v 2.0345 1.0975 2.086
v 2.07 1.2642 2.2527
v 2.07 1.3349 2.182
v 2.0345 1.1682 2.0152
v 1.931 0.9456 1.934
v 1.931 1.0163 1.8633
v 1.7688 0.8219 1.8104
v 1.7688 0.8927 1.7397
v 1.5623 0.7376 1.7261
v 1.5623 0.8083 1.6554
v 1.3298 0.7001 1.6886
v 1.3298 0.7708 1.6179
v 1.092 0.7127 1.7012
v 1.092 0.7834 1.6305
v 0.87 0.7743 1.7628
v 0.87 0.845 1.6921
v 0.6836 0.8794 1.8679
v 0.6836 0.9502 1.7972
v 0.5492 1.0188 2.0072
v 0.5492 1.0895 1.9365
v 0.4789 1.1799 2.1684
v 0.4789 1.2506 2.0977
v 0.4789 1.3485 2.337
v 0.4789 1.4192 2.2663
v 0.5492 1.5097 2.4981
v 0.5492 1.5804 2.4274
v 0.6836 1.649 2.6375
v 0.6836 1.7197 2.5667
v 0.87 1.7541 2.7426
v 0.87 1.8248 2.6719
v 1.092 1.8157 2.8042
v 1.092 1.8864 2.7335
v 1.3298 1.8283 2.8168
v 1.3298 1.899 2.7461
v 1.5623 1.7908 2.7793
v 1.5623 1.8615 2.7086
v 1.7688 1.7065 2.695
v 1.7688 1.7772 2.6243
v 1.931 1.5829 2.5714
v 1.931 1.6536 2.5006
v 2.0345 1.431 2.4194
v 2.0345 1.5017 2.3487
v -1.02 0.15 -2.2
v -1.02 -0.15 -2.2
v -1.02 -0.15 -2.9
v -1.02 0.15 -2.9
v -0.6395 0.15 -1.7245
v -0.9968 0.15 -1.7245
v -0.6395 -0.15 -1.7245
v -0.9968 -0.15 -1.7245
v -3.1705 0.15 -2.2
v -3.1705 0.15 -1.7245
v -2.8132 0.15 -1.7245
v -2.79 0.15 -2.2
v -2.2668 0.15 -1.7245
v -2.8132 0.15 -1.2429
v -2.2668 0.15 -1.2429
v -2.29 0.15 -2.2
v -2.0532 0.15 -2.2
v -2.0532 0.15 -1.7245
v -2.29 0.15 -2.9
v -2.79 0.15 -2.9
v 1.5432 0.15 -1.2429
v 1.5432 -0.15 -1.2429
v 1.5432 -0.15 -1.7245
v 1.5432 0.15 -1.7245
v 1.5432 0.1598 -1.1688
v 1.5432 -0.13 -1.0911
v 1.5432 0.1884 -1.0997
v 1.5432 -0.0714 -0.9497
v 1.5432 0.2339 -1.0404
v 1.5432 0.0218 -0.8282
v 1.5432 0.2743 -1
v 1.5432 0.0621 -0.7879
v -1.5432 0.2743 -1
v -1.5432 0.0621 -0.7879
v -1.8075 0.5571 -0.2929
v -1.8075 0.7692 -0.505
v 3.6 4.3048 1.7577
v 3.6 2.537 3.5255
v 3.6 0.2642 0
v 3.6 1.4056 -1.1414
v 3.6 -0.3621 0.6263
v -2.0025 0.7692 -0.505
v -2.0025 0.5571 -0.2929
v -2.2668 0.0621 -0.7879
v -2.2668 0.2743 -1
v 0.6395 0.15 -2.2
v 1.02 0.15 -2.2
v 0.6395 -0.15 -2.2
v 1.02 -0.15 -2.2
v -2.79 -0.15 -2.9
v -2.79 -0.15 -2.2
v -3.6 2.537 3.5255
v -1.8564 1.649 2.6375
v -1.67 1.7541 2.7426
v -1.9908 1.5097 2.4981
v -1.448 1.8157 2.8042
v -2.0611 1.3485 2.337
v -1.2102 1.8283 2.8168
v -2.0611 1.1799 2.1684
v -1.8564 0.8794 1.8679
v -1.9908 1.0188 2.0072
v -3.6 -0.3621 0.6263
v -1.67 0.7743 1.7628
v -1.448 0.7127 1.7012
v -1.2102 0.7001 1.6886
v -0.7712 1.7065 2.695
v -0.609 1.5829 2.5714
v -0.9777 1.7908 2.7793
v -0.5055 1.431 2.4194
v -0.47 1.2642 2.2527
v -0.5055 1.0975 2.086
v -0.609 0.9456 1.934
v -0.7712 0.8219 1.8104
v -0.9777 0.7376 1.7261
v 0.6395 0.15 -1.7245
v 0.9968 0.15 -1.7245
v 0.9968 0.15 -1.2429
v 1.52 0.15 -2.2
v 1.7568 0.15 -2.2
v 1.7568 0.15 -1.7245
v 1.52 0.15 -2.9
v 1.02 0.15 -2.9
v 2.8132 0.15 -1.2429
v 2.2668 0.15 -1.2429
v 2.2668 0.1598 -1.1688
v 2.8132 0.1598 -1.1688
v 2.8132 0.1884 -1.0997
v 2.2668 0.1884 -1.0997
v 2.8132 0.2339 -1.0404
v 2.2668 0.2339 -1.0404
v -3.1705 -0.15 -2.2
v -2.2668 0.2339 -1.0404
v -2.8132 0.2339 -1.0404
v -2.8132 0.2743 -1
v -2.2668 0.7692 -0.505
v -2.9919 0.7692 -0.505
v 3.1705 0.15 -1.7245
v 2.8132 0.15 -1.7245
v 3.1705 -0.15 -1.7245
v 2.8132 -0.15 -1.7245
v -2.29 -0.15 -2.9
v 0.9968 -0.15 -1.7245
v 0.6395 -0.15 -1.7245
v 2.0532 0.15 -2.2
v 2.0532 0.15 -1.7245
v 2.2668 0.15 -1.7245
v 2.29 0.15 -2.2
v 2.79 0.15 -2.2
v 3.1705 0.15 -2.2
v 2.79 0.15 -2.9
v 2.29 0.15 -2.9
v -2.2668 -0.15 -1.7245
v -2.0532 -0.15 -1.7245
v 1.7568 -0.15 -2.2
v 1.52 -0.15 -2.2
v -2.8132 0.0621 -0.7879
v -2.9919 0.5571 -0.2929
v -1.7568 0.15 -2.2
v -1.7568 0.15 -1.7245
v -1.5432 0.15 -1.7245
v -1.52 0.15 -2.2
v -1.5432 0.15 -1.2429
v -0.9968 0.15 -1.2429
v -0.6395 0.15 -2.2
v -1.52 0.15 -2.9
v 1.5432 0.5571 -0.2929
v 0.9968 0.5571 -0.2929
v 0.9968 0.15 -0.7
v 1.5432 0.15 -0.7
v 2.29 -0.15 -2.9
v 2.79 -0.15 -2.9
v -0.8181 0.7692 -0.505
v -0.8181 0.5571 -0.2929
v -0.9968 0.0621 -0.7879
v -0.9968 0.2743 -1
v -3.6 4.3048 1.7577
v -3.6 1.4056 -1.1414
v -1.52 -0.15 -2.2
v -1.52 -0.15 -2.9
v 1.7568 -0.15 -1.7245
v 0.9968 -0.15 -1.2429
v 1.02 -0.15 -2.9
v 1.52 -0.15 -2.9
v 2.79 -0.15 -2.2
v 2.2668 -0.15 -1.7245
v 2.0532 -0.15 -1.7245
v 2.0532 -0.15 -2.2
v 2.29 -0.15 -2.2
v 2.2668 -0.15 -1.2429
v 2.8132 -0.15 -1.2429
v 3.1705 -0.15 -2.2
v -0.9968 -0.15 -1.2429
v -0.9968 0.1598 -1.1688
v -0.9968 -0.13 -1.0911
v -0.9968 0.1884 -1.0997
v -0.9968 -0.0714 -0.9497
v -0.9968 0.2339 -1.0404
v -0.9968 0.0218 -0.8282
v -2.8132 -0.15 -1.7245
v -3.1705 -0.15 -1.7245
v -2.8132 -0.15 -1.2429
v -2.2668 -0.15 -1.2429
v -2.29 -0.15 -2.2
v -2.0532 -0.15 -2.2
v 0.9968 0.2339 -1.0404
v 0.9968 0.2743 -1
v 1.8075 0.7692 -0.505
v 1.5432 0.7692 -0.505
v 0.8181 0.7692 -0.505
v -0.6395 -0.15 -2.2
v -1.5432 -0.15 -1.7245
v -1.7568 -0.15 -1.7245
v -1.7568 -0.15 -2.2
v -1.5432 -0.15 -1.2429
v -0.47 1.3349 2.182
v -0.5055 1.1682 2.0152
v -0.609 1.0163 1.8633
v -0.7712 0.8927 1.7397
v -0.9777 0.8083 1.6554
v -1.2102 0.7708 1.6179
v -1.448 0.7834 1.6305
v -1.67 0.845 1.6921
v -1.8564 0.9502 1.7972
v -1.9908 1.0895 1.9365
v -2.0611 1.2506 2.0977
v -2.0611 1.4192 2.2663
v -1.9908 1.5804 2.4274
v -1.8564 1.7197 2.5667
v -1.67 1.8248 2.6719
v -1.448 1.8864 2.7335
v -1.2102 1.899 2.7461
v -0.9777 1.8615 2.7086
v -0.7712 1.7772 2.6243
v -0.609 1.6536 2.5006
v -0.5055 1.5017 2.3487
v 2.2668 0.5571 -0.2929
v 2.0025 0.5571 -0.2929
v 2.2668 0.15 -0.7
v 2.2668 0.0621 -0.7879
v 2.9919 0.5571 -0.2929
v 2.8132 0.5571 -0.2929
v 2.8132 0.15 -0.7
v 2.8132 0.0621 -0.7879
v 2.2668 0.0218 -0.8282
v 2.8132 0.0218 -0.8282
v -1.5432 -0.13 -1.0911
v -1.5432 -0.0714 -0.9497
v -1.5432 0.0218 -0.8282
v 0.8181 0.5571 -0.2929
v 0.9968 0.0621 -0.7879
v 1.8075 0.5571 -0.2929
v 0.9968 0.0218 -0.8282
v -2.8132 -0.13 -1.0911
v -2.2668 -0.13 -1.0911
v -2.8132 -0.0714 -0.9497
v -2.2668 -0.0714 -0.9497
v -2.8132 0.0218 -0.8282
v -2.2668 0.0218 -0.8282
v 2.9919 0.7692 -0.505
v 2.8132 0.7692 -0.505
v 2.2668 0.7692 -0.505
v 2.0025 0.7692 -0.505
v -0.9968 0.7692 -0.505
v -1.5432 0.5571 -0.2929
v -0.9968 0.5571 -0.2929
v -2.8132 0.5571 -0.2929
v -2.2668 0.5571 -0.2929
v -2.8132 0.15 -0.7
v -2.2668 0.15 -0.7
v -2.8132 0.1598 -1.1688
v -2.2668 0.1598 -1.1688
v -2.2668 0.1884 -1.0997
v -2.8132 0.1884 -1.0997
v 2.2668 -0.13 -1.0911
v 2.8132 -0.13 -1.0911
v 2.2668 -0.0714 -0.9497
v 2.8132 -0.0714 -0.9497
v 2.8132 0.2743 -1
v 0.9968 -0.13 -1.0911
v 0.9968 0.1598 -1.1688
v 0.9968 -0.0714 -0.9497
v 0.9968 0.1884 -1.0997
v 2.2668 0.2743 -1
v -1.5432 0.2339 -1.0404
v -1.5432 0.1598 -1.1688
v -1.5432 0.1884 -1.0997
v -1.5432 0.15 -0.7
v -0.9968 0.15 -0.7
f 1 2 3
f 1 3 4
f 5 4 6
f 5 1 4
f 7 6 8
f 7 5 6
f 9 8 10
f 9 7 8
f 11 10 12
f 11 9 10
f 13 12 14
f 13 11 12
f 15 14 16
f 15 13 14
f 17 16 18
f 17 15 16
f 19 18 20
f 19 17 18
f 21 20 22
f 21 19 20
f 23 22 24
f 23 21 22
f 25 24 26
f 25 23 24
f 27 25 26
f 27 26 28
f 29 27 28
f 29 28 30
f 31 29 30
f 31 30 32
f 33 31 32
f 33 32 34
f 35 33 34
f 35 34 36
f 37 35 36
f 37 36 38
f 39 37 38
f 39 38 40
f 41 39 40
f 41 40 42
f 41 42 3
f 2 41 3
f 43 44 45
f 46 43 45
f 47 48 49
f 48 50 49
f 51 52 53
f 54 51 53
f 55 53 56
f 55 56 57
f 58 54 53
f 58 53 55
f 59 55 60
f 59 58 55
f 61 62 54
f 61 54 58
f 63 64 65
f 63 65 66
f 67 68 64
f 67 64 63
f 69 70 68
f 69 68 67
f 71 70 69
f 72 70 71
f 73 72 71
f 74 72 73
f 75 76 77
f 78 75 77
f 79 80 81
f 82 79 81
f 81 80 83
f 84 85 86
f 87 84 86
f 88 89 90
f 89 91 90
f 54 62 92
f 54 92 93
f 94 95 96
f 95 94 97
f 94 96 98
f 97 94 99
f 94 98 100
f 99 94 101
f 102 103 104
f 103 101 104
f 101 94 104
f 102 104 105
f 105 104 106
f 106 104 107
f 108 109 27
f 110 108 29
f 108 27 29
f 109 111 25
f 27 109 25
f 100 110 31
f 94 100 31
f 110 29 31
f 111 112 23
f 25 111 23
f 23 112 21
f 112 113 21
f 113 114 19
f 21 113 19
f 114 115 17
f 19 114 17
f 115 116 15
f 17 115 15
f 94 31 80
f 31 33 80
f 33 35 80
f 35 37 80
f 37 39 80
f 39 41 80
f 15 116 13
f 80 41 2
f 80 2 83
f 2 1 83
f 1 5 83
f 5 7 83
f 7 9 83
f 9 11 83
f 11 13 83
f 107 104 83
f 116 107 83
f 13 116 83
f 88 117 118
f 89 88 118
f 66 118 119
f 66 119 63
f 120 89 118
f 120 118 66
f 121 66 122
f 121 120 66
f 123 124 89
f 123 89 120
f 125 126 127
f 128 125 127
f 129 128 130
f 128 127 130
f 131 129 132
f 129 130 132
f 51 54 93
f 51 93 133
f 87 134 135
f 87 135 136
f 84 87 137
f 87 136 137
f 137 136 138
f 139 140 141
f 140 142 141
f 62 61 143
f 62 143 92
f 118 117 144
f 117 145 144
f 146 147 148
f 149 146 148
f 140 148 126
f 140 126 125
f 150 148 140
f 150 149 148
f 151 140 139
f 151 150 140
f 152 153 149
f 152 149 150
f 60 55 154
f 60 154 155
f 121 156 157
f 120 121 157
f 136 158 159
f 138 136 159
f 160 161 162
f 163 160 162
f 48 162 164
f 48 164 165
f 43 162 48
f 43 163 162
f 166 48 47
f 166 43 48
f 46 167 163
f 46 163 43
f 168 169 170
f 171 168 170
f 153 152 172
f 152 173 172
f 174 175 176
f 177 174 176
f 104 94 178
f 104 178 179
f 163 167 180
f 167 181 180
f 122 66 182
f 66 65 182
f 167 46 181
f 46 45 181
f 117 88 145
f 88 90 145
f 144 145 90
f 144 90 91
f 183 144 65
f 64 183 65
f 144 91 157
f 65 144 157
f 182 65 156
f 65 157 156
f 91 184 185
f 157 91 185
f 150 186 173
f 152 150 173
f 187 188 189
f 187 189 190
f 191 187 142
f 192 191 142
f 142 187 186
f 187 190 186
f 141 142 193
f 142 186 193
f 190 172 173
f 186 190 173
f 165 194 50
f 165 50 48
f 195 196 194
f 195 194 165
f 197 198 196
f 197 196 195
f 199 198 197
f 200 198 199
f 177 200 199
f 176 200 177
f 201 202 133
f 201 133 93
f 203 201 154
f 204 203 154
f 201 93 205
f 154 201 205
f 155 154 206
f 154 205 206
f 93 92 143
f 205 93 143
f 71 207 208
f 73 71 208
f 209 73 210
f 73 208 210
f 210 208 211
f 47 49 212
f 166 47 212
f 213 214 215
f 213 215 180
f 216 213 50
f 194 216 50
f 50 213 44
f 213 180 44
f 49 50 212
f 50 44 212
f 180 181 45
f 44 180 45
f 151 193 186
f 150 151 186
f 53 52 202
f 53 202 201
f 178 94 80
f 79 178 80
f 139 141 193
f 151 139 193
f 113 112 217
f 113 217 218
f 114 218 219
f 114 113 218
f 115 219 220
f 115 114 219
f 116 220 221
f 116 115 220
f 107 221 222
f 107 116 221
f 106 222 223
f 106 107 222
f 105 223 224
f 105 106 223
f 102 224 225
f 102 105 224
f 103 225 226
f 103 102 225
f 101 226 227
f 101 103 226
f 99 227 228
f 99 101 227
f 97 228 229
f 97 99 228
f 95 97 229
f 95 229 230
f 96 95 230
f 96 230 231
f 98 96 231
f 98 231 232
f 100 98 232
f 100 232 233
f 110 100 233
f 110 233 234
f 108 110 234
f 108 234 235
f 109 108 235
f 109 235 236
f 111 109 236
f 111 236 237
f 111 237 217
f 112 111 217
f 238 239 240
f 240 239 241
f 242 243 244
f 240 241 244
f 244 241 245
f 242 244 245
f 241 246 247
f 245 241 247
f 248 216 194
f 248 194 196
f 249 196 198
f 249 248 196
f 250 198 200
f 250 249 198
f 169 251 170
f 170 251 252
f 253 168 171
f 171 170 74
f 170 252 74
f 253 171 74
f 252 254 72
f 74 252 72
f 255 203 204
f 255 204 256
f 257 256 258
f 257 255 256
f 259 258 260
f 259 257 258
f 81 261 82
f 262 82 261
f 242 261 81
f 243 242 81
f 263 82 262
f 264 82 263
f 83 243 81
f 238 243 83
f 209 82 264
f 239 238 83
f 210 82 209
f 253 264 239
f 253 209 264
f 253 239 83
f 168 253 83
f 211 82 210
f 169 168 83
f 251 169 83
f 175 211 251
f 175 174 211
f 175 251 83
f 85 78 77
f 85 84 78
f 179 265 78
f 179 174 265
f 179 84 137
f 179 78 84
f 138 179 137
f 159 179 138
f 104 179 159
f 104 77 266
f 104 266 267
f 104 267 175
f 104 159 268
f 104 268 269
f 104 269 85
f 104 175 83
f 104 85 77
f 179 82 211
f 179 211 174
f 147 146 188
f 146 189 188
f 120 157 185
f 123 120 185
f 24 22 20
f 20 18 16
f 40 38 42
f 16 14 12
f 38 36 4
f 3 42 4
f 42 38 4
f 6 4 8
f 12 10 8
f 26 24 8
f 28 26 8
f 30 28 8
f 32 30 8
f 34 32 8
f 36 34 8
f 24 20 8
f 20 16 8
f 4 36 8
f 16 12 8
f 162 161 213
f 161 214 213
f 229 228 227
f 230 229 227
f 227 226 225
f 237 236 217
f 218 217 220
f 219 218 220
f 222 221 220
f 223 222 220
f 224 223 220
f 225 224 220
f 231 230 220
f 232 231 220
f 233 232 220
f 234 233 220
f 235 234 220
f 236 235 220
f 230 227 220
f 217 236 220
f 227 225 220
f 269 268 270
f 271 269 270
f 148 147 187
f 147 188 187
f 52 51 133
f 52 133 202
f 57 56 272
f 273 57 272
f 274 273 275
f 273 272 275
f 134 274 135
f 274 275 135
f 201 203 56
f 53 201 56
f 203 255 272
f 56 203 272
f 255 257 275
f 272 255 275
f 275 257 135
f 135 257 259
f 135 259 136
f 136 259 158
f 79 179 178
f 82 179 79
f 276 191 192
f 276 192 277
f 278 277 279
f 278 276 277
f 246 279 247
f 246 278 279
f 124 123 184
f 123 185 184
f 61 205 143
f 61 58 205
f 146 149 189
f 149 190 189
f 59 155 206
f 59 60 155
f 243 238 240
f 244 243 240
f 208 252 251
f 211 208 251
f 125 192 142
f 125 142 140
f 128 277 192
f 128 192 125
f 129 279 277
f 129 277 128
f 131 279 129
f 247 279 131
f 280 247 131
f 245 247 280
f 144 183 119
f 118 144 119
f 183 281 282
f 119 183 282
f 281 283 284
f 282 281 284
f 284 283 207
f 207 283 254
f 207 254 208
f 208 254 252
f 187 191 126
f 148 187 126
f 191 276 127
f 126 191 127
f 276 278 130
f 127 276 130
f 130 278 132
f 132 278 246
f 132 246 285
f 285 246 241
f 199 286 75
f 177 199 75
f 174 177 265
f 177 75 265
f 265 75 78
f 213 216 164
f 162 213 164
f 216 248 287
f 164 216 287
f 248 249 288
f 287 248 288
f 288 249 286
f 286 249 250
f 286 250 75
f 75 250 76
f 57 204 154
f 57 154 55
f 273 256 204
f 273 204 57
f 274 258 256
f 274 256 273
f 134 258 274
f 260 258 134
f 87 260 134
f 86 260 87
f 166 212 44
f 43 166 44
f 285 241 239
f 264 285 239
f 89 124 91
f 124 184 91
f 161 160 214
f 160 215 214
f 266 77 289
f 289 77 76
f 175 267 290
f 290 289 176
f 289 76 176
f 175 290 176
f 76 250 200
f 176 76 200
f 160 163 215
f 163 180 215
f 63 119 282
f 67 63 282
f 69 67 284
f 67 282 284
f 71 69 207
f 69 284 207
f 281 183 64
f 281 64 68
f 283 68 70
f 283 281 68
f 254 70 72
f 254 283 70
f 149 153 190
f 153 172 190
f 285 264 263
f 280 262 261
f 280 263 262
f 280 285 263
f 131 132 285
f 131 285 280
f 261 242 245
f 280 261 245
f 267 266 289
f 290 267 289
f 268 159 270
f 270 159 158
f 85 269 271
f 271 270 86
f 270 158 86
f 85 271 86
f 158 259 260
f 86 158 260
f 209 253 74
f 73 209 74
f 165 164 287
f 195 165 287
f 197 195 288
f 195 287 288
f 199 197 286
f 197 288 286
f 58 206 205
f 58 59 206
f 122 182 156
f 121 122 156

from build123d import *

# Parameters (mm, degrees)
ESQUISSE2_W          = 7.2
ESQUISSE2_H          = 2.5
BOITIER_DEPTH        = 4.1
FENETRECAPTEUR_START = -1.45
ESQUISSE4_R          = 0.8
FENETRECAPTEUR_DEPTH = 0.1
PATTES_DEPTH         = 0.15
PLIAGE_START         = -5
PLIAGE_1_OUTLINE_W   = 7.2
PLIAGE_1_OUTLINE_H   = 4.1
PLIAGE_1_DEPTH       = 4.301040764
PLIAGE_START_2       = -0.698959236
PLIAGE_1_2_OUTLINE_R = 0.8
PLIAGE_1_2_DEPTH     = 0.1
PLIAGE_START_3       = -0.598959236
PLIAGE_1_3_OUTLINE_W = 7.2
PLIAGE_1_3_OUTLINE_H = 4.1
PLIAGE_1_3_DEPTH     = 2.4
PLIAGE_1_4_OUTLINE_W = 7.2
PLIAGE_1_4_OUTLINE_H = 4.1
PLIAGE_1_4_OUTLINE_R = 0.8
PLIAGE_1_4_DEPTH     = 0.1
PLIAGE_START_4       = -3.6
PLIAGE_1_5_DEPTH     = 7.2
PLIAGE_START_5       = -2.813242849
PLIAGE_1_6_DEPTH     = 0.546485698
PLIAGE_START_6       = -1.543242849
PLIAGE_1_7_DEPTH     = 0.546485698
PLIAGE_START_7       = 0.996757151
PLIAGE_1_8_DEPTH     = 0.546485698
PLIAGE_START_8       = 2.266757151
PLIAGE_1_9_DEPTH     = 0.546485698
PLIAGE_START_9       = 0.601040763
PLIAGE_1_10_DEPTH    = 0.300000001


with BuildPart() as part:
    # Esquisse2 → Boitier (new body)
    with BuildSketch(Plane.XY):
        with Locations((0, -0.2)):
            Rectangle(ESQUISSE2_W, ESQUISSE2_H)
    extrude(amount=BOITIER_DEPTH)

    # Esquisse4 → FenetreCapteur (cut)
    with BuildSketch(Plane(origin=(0, 0, 0), x_dir=(1, 0, 0), z_dir=(0, 1, 0)).offset(FENETRECAPTEUR_START)):
        with Locations(Location((-1.27, -2.3, 0), (0, 0, 180))):
            Circle(ESQUISSE4_R)
        with Locations(Location((1.27, -2.3, 0), (0, 0, 180))):
            Circle(ESQUISSE4_R)
    extrude(amount=FENETRECAPTEUR_DEPTH, mode=Mode.SUBTRACT)

    # Esquisse5 → Pattes (add, symmetric)
    with BuildSketch(Plane(origin=(0, 0, 0), x_dir=(1, 0, 0), z_dir=(0, 1, 0))):
        Polygon((2.79, 2.2), (2.79, 2.9), (2.29, 2.9), (2.29, 2.2), (2.053248267, 2.2), (2.053248267, 1.724539267), (2.266757151, 1.724539267), (2.266757151, 0.7), (2.002499851, 0), (2.991852509, 0), (2.813242849, 0.7), (2.813242849, 1.724539267), (3.170462168, 1.724539267), (3.170462168, 2.2), align=None)
        Polygon((1.52, 2.2), (1.52, 2.9), (1.02, 2.9), (1.02, 2.2), (0.639537832, 2.2), (0.639537832, 1.724539267), (0.996757151, 1.724539267), (0.996757151, 0.7), (0.818147491, 0), (1.807500149, 0), (1.543242849, 0.7), (1.543242849, 1.724539267), (1.756751733, 1.724539267), (1.756751733, 2.2), align=None)
        Polygon((-1.02, 2.2), (-1.02, 2.9), (-1.52, 2.9), (-1.52, 2.2), (-1.756751733, 2.2), (-1.756751733, 1.724539267), (-1.543242849, 1.724539267), (-1.543242849, 0.7), (-1.807500149, 0), (-0.818147491, 0), (-0.996757151, 0.7), (-0.996757151, 1.724539267), (-0.639537832, 1.724539267), (-0.639537832, 2.2), align=None)
        Polygon((-2.29, 2.2), (-2.29, 2.9), (-2.79, 2.9), (-2.79, 2.2), (-3.170462168, 2.2), (-3.170462168, 1.724539267), (-2.813242849, 1.724539267), (-2.813242849, 0.7), (-2.991852509, 0), (-2.002499851, 0), (-2.266757151, 0.7), (-2.266757151, 1.724539267), (-2.053248267, 1.724539267), (-2.053248267, 2.2), align=None)
    extrude(amount=PATTES_DEPTH, both=True)

    # Pliage 1: read off the stored shape, not the designer's step
    # Pliage 1 outline → Pliage 1 (cut)
    with BuildSketch(Plane(origin=(0, 0, 0), x_dir=(1, 0, 0), z_dir=(0, 0.707106781186546, -0.707106781186549)).offset(PLIAGE_START)):
        with Locations((0, -2.236827202)):
            Rectangle(PLIAGE_1_OUTLINE_W, PLIAGE_1_OUTLINE_H)
    extrude(amount=PLIAGE_1_DEPTH, mode=Mode.SUBTRACT)

    # Pliage 1 2 outline → Pliage 1 2 (cut)
    with BuildSketch(Plane(origin=(0, 0, 0), x_dir=(1, 0, 0), z_dir=(0, 0.707106781186546, -0.707106781186549)).offset(PLIAGE_START_2)):
        with Locations((-1.27, -2.486827202)):
            Circle(PLIAGE_1_2_OUTLINE_R)
        with Locations((1.27, -2.486827202)):
            Circle(PLIAGE_1_2_OUTLINE_R)
    extrude(amount=PLIAGE_1_2_DEPTH, mode=Mode.SUBTRACT)

    # Pliage 1 3 outline → Pliage 1 3 (add)
    with BuildSketch(Plane(origin=(0, 0, 0), x_dir=(1, 0, 0), z_dir=(0, 0.707106781186546, -0.707106781186549)).offset(PLIAGE_START_3)):
        with Locations((0, -2.236827202)):
            Rectangle(PLIAGE_1_3_OUTLINE_W, PLIAGE_1_3_OUTLINE_H)
    extrude(amount=PLIAGE_1_3_DEPTH)

    # Pliage 1 4 outline → Pliage 1 4 (add)
    with BuildSketch(Plane(origin=(0, 0, 0), x_dir=(1, 0, 0), z_dir=(0, 0.707106781186546, -0.707106781186549)).offset(PLIAGE_START_2)):
        with Locations((0, -2.236827202)):
            Rectangle(PLIAGE_1_4_OUTLINE_W, PLIAGE_1_4_OUTLINE_H)
        with Locations((-1.27, -2.486827202)):
            Circle(PLIAGE_1_4_OUTLINE_R, mode=Mode.SUBTRACT)
        with Locations((1.27, -2.486827202)):
            Circle(PLIAGE_1_4_OUTLINE_R, mode=Mode.SUBTRACT)
    extrude(amount=PLIAGE_1_4_DEPTH)

    # Pliage 1 5 outline → Pliage 1 5 (cut)
    with BuildSketch(Plane.YZ.offset(PLIAGE_START_4)):
        with BuildLine():
            Line((0.021781873, -0.828218127), (0.15, -0.7))
            Line((0.15, -0.7), (0.15, 0))
            Line((0.15, 0), (0.264213563, 0))
            Line((0.264213563, 0), (-1.35, 1.614213563))
            Line((-1.35, 1.614213563), (-1.45, 1.714213563))
            Line((-1.45, 1.714213563), (-1.45, 0))
            Line((-1.45, 0), (-0.15, 0))
            Line((-0.15, 0), (-0.15, -1.242936254))
            ThreePointArc((-0.15, -1.242936254), (-0.105355346, -1.018492421), (0.021781873, -0.828218127))
        make_face()
    extrude(amount=PLIAGE_1_5_DEPTH, mode=Mode.SUBTRACT)

    # Pliage 1 6 outline → Pliage 1 6 (add)
    with BuildSketch(Plane.YZ.offset(PLIAGE_START_5)):
        with BuildLine():
            Line((0.769238816, -0.505025253), (0.557106781, -0.292893218))
            Line((0.557106781, -0.292893218), (0.15, -0.7))
            Line((0.15, -0.7), (0.15, -1.242936254))
            ThreePointArc((0.15, -1.242936254), (0.171808514, -1.133297451), (0.233913907, -1.040350162))
            Line((0.233913907, -1.040350162), (0.769238816, -0.505025253))
        make_face()
    extrude(amount=PLIAGE_1_6_DEPTH)

    # Pliage 1 7 outline → Pliage 1 7 (add)
    with BuildSketch(Plane.YZ.offset(PLIAGE_START_6)):
        with BuildLine():
            Line((0.769238816, -0.505025253), (0.557106781, -0.292893218))
            Line((0.557106781, -0.292893218), (0.15, -0.7))
            Line((0.15, -0.7), (0.15, -1.242936254))
            ThreePointArc((0.15, -1.242936254), (0.171808514, -1.133297451), (0.233913907, -1.040350162))
            Line((0.233913907, -1.040350162), (0.769238816, -0.505025253))
        make_face()
    extrude(amount=PLIAGE_1_7_DEPTH)

    # Pliage 1 8 outline → Pliage 1 8 (add)
    with BuildSketch(Plane.YZ.offset(PLIAGE_START_7)):
        with BuildLine():
            Line((0.769238816, -0.505025253), (0.557106781, -0.292893218))
            Line((0.557106781, -0.292893218), (0.15, -0.7))
            Line((0.15, -0.7), (0.15, -1.242936254))
            ThreePointArc((0.15, -1.242936254), (0.171808514, -1.133297451), (0.233913907, -1.040350162))
            Line((0.233913907, -1.040350162), (0.769238816, -0.505025253))
        make_face()
    extrude(amount=PLIAGE_1_8_DEPTH)

    # Pliage 1 9 outline → Pliage 1 9 (add)
    with BuildSketch(Plane.YZ.offset(PLIAGE_START_8)):
        with BuildLine():
            Line((0.769238816, -0.505025253), (0.557106781, -0.292893218))
            Line((0.557106781, -0.292893218), (0.15, -0.7))
            Line((0.15, -0.7), (0.15, -1.242936254))
            ThreePointArc((0.15, -1.242936254), (0.171808514, -1.133297451), (0.233913907, -1.040350162))
            Line((0.233913907, -1.040350162), (0.769238816, -0.505025253))
        make_face()
    extrude(amount=PLIAGE_1_9_DEPTH)

    # Pliage 1 10 outline → Pliage 1 10 (add)
    with BuildSketch(Plane(origin=(0, 0, 0), x_dir=(1, 0, 0), z_dir=(0, 0.707106781186546, -0.707106781186549)).offset(PLIAGE_START_9)):
        Polygon((2.813242849, 0.513172798), (2.813242849, -0.186827202), (2.991852509, -0.186827202), align=None)
        Polygon((-2.991852509, -0.186827202), (-2.813242849, -0.186827202), (-2.813242849, 0.513172798), align=None)
        Polygon((-2.266757151, -0.186827202), (-2.002499851, -0.186827202), (-2.266757151, 0.513172798), align=None)
        Polygon((-1.807500149, -0.186827202), (-1.543242849, -0.186827202), (-1.543242849, 0.513172798), align=None)
        Polygon((-0.996757151, -0.186827202), (-0.818147491, -0.186827202), (-0.996757151, 0.513172798), align=None)
        Polygon((0.818147491, -0.186827202), (0.996757151, -0.186827202), (0.996757151, 0.513172798), align=None)
        Polygon((1.543242849, -0.186827202), (1.807500149, -0.186827202), (1.543242849, 0.513172798), align=None)
        Polygon((2.266757151, 0.513172798), (2.002499851, -0.186827202), (2.266757151, -0.186827202), align=None)
    extrude(amount=PLIAGE_1_10_DEPTH)


solid = part.part
